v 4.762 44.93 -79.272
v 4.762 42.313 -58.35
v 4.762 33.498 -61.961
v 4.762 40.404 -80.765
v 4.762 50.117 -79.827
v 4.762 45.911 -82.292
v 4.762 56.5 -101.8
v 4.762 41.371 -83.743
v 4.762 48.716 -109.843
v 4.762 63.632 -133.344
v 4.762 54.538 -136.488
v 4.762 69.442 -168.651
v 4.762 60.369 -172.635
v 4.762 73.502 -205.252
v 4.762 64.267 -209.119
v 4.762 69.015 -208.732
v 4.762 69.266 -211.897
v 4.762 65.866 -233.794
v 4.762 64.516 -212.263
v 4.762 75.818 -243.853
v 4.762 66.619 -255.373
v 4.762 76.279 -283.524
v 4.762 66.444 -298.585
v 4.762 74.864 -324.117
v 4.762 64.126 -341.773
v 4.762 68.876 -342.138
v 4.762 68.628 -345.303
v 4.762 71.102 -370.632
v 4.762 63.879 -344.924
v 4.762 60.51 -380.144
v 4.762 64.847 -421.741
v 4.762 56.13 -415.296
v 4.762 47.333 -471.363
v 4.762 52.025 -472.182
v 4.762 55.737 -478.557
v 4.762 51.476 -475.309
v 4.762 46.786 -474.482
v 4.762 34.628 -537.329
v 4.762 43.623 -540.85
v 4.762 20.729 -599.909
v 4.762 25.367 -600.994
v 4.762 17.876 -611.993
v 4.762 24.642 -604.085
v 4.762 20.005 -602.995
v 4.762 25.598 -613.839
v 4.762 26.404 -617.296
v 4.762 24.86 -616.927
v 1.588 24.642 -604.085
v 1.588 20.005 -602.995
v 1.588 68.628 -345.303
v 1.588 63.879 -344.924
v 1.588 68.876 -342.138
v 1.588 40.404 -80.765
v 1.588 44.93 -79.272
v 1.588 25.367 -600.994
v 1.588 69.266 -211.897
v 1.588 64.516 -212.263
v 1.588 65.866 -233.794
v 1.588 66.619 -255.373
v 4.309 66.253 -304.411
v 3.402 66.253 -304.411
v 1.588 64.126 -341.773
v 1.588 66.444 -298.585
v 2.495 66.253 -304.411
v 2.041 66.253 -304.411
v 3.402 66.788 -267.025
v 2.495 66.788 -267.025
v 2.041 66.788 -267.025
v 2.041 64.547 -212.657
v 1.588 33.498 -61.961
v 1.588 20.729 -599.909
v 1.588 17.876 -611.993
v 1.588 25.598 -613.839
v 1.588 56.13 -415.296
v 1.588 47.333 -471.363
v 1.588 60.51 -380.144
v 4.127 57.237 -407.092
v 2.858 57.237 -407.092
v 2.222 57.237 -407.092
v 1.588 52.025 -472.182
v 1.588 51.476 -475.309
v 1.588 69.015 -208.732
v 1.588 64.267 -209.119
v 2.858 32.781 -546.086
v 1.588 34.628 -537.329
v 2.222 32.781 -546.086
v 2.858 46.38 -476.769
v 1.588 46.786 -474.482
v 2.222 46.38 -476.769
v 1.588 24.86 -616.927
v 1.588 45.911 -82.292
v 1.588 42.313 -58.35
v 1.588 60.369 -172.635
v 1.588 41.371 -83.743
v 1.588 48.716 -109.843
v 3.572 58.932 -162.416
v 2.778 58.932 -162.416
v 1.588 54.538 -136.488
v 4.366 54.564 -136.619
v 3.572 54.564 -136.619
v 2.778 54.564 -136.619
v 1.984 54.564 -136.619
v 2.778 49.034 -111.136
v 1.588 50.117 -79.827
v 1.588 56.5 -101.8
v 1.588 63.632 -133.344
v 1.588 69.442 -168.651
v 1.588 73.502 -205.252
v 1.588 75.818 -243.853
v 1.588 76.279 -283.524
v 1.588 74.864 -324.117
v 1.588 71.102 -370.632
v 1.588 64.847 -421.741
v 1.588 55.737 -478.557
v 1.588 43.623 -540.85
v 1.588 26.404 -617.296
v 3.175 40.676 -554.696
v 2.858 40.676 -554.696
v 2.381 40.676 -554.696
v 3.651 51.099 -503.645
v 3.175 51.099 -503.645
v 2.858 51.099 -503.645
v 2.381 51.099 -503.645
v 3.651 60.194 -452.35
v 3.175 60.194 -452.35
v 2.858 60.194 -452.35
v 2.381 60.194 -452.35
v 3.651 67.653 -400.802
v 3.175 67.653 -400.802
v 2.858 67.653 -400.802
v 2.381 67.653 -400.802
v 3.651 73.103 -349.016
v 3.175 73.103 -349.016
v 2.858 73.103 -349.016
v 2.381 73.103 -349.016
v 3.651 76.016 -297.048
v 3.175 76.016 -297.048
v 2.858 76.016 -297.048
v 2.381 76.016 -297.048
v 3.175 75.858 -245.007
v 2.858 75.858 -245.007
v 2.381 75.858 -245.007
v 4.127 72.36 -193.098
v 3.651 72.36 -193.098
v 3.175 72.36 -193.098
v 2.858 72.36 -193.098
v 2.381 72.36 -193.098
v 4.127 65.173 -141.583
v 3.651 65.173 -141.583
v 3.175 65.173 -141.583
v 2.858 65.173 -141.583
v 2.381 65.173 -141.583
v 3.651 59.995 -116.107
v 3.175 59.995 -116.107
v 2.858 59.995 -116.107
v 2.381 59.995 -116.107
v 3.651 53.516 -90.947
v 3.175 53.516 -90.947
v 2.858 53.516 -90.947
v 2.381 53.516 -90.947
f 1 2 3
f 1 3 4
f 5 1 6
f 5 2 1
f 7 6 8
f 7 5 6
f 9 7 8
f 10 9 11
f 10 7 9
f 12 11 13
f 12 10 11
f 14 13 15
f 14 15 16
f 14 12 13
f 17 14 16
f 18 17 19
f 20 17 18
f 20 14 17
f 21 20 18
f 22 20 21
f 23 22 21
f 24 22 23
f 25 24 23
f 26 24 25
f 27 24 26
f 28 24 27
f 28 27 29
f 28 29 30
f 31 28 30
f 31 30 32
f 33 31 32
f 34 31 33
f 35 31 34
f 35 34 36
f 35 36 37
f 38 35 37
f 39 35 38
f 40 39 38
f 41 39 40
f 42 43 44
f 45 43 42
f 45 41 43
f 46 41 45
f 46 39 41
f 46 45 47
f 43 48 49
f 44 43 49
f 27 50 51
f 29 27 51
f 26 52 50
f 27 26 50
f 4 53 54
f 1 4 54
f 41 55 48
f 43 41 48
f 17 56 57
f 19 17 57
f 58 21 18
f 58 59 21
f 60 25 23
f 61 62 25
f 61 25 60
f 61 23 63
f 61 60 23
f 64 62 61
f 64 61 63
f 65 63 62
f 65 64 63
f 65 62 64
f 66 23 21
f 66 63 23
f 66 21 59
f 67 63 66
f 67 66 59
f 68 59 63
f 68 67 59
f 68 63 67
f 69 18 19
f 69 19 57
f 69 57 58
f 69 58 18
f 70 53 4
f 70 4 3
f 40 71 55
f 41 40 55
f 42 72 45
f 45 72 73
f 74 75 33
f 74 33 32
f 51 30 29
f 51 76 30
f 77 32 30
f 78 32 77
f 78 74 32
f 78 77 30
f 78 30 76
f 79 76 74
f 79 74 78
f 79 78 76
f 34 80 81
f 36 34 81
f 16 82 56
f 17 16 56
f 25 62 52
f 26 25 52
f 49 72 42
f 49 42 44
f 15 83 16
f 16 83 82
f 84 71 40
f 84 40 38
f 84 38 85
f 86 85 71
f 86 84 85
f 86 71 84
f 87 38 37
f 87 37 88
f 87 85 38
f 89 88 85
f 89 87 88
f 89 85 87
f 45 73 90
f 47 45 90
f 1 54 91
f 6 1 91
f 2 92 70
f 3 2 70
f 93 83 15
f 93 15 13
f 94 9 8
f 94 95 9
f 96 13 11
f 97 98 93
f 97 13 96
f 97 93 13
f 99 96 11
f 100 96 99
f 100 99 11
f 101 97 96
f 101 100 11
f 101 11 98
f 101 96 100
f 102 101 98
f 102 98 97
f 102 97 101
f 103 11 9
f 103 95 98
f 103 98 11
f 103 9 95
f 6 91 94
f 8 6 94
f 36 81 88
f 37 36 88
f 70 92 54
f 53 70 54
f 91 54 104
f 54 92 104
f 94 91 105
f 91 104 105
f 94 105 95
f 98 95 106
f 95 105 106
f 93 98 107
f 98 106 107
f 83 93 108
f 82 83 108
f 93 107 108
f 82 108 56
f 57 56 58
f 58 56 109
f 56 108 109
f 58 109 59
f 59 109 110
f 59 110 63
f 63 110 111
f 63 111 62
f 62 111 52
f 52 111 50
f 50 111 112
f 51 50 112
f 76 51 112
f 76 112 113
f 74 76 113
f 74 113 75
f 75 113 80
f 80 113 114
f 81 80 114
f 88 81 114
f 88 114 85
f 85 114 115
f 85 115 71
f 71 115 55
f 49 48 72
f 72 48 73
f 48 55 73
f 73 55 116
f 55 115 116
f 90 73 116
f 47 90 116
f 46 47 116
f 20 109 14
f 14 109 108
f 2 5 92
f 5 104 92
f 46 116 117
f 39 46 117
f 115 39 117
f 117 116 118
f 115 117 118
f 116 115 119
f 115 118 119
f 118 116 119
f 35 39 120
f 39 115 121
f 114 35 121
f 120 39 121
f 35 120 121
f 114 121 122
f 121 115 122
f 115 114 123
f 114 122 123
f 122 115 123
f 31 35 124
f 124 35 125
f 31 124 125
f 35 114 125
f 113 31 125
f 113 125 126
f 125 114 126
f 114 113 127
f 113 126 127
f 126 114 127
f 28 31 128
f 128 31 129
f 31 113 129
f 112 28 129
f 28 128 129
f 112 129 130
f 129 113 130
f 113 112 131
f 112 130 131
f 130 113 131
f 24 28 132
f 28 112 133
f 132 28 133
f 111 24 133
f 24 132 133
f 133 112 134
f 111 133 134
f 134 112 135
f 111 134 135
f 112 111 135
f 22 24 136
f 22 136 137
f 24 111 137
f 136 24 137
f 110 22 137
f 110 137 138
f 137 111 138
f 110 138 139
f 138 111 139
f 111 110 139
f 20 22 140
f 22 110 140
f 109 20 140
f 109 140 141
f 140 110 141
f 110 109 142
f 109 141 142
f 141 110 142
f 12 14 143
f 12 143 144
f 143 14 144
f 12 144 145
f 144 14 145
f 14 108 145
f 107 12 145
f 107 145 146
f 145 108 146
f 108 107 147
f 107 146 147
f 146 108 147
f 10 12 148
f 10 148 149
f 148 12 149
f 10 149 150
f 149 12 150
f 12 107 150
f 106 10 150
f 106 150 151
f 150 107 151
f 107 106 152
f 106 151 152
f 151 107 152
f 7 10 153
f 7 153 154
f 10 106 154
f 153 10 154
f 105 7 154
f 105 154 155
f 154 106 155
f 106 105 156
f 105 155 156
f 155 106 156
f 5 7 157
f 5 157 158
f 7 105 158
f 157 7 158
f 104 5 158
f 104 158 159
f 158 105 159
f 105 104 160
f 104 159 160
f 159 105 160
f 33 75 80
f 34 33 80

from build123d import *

# Parameters (mm, degrees)
BOSS_EXTRUDE2_START = 1.5875
BOSS_EXTRUDE2_DEPTH = 3.175


with BuildPart() as part:
    # Sketch1 → Boss-Extrude2 (new body)
    with BuildSketch(Plane(origin=(0, 0, 0), x_dir=(0, 0, -1), z_dir=(1, 0, 0)).offset(BOSS_EXTRUDE2_START)):
        with BuildLine():
            add(Edge.make_bspline(
                [(617.296334759, 26.403582169), (615.184301915, 26.908512482), (610.959288876, 27.914287333), (590.127541527, 32.829631776), (554.428003339, 40.913855014), (503.686138006, 51.318593932), (452.392596731, 60.465829991), (400.843471229, 67.985015872), (357.679132335, 72.589063507), (323.056220782, 75.05029926), (288.383000879, 76.508441281), (253.666561863, 76.425834439), (219.00998711, 74.703065258), (193.082327137, 72.512170168), (167.246128756, 69.410412561), (141.548940999, 65.354237292), (116.056003419, 60.208718519), (95.065092929, 54.851033869), (78.512288233, 49.775279208), (68.676082386, 46.349486029), (61.98632054, 43.782524426), (59.349501123, 42.721922328), (58.35028136, 42.31261335)],
                knots=[0.235495017, 0.235495017, 0.235495017, 0.235495017, 0.243307517, 0.251120017, 0.3125, 0.375, 0.4375, 0.5, 0.5625, 0.59375, 0.625, 0.6875, 0.71875, 0.75, 0.78125, 0.8125, 0.84375, 0.875, 0.890625, 0.90625, 0.912623667, 0.916529917, 0.916529917, 0.916529917, 0.916529917], degree=3))
            Line((58.35028136, 42.31261335), (61.960818582, 33.498440334))
            add(Edge.make_bspline(
                [(80.765487592, 40.403971738), (80.641658459, 40.363120288), (79.705797378, 40.053764879), (76.058349534, 38.829801361), (69.87113551, 36.632249503), (64.588433246, 34.574786411), (61.960818582, 33.498440334)],
                knots=[0.891585006, 0.891585006, 0.891585006, 0.891585006, 0.892069486, 0.895247576, 0.905888747, 0.916529917, 0.916529917, 0.916529917, 0.916529917], degree=3))
            Line((80.765487592, 40.403971738), (79.272271862, 44.930215281))
            Line((79.272271862, 44.930215281), (82.292039539, 45.9108417))
            Line((82.292039539, 45.9108417), (83.743360553, 41.371042866))
            add(Edge.make_bspline(
                [(209.118614924, 64.266949703), (208.987607746, 64.256277984), (204.983606318, 63.929041788), (189.3689148, 62.525717248), (162.355837105, 59.226646099), (133.710472047, 54.218983274), (111.101045047, 49.13527315), (96.457540116, 45.269363387), (87.39676216, 42.536792097), (83.867679496, 41.41078619), (83.743360553, 41.371042866)],
                knots=[0.731607855, 0.731607855, 0.731607855, 0.731607855, 0.732087614, 0.746271192, 0.788835873, 0.831400555, 0.852682895, 0.873965236, 0.887225543, 0.887709851, 0.887709851, 0.887709851, 0.887709851], degree=3))
            Line((209.118614924, 64.266949703), (208.73180914, 69.015419412))
            Line((208.73180914, 69.015419412), (211.896871614, 69.266426461))
            Line((211.896871614, 69.266426461), (212.263363621, 64.516346849))
            add(Edge.make_bspline(
                [(341.77301052, 64.125891337), (341.641715735, 64.135975948), (340.086535396, 64.255117907), (326.855067365, 65.235313291), (302.0845014, 66.573100845), (267.019938729, 67.029511391), (237.191430938, 66.186839541), (218.967979086, 65.031872482), (212.394418494, 64.526458377), (212.263363621, 64.516346849)],
                knots=[0.570343597, 0.570343597, 0.570343597, 0.570343597, 0.570822185, 0.576012467, 0.618577148, 0.661141829, 0.703706511, 0.727290053, 0.727769806, 0.727769806, 0.727769806, 0.727769806], degree=3))
            Line((341.77301052, 64.125891337), (342.137830582, 68.87560072))
            Line((342.137830582, 68.87560072), (345.303134285, 68.627654217))
            Line((345.303134285, 68.627654217), (344.924025936, 63.879074739))
            add(Edge.make_bspline(
                [(471.36269634, 47.333243498), (471.232728453, 47.355942137), (449.859334549, 51.086308134), (416.816830974, 56.23284789), (374.87201984, 61.216445173), (354.12724004, 63.142633245), (345.055315661, 63.868593071), (344.924025936, 63.879074739)],
                knots=[0.412374275, 0.412374275, 0.412374275, 0.412374275, 0.41285168, 0.490883104, 0.533447786, 0.566036483, 0.566515036, 0.566515036, 0.566515036, 0.566515036], degree=3))
            Line((471.36269634, 47.333243498), (472.182177193, 52.025427747))
            Line((472.182177193, 52.025427747), (475.309347299, 51.476399398))
            Line((475.309347299, 51.476399398), (474.481525493, 46.785682475))
            add(Edge.make_bspline(
                [(599.908904815, 20.729034105), (599.780288878, 20.759131966), (581.87021839, 24.949139998), (540.91919667, 34.150667692), (499.303273759, 42.385681838), (475.373897939, 46.628107797), (474.611460048, 46.762751511), (474.481525493, 46.785682475)],
                knots=[0.25424764, 0.25424764, 0.25424764, 0.25424764, 0.254724311, 0.320624379, 0.405753742, 0.408077679, 0.408555073, 0.408555073, 0.408555073, 0.408555073], degree=3))
            Line((599.908904815, 20.729034105), (600.994167359, 25.366641285))
            Line((600.994167359, 25.366641285), (604.085283853, 24.641642099))
            Line((604.085283853, 24.641642099), (602.995386693, 20.005124146))
            add(Edge.make_bspline(
                [(611.993248957, 17.876436525), (611.735864961, 17.937711546), (610.172224401, 18.309767327), (607.301737758, 18.990564407), (604.559549516, 19.637345533), (603.12397738, 19.974896587), (602.995386693, 20.005124146)],
                knots=[0.239313408, 0.239313408, 0.239313408, 0.239313408, 0.240268006, 0.245112823, 0.24995764, 0.250434304, 0.250434304, 0.250434304, 0.250434304], degree=3))
            Line((611.993248957, 17.876436525), (613.839230468, 25.597845751))
            Line((613.839230468, 25.597845751), (616.927208468, 24.859593169))
            Line((616.927208468, 24.859593169), (617.296334759, 26.403582169))
        make_face()
    extrude(amount=BOSS_EXTRUDE2_DEPTH)


solid = part.part
